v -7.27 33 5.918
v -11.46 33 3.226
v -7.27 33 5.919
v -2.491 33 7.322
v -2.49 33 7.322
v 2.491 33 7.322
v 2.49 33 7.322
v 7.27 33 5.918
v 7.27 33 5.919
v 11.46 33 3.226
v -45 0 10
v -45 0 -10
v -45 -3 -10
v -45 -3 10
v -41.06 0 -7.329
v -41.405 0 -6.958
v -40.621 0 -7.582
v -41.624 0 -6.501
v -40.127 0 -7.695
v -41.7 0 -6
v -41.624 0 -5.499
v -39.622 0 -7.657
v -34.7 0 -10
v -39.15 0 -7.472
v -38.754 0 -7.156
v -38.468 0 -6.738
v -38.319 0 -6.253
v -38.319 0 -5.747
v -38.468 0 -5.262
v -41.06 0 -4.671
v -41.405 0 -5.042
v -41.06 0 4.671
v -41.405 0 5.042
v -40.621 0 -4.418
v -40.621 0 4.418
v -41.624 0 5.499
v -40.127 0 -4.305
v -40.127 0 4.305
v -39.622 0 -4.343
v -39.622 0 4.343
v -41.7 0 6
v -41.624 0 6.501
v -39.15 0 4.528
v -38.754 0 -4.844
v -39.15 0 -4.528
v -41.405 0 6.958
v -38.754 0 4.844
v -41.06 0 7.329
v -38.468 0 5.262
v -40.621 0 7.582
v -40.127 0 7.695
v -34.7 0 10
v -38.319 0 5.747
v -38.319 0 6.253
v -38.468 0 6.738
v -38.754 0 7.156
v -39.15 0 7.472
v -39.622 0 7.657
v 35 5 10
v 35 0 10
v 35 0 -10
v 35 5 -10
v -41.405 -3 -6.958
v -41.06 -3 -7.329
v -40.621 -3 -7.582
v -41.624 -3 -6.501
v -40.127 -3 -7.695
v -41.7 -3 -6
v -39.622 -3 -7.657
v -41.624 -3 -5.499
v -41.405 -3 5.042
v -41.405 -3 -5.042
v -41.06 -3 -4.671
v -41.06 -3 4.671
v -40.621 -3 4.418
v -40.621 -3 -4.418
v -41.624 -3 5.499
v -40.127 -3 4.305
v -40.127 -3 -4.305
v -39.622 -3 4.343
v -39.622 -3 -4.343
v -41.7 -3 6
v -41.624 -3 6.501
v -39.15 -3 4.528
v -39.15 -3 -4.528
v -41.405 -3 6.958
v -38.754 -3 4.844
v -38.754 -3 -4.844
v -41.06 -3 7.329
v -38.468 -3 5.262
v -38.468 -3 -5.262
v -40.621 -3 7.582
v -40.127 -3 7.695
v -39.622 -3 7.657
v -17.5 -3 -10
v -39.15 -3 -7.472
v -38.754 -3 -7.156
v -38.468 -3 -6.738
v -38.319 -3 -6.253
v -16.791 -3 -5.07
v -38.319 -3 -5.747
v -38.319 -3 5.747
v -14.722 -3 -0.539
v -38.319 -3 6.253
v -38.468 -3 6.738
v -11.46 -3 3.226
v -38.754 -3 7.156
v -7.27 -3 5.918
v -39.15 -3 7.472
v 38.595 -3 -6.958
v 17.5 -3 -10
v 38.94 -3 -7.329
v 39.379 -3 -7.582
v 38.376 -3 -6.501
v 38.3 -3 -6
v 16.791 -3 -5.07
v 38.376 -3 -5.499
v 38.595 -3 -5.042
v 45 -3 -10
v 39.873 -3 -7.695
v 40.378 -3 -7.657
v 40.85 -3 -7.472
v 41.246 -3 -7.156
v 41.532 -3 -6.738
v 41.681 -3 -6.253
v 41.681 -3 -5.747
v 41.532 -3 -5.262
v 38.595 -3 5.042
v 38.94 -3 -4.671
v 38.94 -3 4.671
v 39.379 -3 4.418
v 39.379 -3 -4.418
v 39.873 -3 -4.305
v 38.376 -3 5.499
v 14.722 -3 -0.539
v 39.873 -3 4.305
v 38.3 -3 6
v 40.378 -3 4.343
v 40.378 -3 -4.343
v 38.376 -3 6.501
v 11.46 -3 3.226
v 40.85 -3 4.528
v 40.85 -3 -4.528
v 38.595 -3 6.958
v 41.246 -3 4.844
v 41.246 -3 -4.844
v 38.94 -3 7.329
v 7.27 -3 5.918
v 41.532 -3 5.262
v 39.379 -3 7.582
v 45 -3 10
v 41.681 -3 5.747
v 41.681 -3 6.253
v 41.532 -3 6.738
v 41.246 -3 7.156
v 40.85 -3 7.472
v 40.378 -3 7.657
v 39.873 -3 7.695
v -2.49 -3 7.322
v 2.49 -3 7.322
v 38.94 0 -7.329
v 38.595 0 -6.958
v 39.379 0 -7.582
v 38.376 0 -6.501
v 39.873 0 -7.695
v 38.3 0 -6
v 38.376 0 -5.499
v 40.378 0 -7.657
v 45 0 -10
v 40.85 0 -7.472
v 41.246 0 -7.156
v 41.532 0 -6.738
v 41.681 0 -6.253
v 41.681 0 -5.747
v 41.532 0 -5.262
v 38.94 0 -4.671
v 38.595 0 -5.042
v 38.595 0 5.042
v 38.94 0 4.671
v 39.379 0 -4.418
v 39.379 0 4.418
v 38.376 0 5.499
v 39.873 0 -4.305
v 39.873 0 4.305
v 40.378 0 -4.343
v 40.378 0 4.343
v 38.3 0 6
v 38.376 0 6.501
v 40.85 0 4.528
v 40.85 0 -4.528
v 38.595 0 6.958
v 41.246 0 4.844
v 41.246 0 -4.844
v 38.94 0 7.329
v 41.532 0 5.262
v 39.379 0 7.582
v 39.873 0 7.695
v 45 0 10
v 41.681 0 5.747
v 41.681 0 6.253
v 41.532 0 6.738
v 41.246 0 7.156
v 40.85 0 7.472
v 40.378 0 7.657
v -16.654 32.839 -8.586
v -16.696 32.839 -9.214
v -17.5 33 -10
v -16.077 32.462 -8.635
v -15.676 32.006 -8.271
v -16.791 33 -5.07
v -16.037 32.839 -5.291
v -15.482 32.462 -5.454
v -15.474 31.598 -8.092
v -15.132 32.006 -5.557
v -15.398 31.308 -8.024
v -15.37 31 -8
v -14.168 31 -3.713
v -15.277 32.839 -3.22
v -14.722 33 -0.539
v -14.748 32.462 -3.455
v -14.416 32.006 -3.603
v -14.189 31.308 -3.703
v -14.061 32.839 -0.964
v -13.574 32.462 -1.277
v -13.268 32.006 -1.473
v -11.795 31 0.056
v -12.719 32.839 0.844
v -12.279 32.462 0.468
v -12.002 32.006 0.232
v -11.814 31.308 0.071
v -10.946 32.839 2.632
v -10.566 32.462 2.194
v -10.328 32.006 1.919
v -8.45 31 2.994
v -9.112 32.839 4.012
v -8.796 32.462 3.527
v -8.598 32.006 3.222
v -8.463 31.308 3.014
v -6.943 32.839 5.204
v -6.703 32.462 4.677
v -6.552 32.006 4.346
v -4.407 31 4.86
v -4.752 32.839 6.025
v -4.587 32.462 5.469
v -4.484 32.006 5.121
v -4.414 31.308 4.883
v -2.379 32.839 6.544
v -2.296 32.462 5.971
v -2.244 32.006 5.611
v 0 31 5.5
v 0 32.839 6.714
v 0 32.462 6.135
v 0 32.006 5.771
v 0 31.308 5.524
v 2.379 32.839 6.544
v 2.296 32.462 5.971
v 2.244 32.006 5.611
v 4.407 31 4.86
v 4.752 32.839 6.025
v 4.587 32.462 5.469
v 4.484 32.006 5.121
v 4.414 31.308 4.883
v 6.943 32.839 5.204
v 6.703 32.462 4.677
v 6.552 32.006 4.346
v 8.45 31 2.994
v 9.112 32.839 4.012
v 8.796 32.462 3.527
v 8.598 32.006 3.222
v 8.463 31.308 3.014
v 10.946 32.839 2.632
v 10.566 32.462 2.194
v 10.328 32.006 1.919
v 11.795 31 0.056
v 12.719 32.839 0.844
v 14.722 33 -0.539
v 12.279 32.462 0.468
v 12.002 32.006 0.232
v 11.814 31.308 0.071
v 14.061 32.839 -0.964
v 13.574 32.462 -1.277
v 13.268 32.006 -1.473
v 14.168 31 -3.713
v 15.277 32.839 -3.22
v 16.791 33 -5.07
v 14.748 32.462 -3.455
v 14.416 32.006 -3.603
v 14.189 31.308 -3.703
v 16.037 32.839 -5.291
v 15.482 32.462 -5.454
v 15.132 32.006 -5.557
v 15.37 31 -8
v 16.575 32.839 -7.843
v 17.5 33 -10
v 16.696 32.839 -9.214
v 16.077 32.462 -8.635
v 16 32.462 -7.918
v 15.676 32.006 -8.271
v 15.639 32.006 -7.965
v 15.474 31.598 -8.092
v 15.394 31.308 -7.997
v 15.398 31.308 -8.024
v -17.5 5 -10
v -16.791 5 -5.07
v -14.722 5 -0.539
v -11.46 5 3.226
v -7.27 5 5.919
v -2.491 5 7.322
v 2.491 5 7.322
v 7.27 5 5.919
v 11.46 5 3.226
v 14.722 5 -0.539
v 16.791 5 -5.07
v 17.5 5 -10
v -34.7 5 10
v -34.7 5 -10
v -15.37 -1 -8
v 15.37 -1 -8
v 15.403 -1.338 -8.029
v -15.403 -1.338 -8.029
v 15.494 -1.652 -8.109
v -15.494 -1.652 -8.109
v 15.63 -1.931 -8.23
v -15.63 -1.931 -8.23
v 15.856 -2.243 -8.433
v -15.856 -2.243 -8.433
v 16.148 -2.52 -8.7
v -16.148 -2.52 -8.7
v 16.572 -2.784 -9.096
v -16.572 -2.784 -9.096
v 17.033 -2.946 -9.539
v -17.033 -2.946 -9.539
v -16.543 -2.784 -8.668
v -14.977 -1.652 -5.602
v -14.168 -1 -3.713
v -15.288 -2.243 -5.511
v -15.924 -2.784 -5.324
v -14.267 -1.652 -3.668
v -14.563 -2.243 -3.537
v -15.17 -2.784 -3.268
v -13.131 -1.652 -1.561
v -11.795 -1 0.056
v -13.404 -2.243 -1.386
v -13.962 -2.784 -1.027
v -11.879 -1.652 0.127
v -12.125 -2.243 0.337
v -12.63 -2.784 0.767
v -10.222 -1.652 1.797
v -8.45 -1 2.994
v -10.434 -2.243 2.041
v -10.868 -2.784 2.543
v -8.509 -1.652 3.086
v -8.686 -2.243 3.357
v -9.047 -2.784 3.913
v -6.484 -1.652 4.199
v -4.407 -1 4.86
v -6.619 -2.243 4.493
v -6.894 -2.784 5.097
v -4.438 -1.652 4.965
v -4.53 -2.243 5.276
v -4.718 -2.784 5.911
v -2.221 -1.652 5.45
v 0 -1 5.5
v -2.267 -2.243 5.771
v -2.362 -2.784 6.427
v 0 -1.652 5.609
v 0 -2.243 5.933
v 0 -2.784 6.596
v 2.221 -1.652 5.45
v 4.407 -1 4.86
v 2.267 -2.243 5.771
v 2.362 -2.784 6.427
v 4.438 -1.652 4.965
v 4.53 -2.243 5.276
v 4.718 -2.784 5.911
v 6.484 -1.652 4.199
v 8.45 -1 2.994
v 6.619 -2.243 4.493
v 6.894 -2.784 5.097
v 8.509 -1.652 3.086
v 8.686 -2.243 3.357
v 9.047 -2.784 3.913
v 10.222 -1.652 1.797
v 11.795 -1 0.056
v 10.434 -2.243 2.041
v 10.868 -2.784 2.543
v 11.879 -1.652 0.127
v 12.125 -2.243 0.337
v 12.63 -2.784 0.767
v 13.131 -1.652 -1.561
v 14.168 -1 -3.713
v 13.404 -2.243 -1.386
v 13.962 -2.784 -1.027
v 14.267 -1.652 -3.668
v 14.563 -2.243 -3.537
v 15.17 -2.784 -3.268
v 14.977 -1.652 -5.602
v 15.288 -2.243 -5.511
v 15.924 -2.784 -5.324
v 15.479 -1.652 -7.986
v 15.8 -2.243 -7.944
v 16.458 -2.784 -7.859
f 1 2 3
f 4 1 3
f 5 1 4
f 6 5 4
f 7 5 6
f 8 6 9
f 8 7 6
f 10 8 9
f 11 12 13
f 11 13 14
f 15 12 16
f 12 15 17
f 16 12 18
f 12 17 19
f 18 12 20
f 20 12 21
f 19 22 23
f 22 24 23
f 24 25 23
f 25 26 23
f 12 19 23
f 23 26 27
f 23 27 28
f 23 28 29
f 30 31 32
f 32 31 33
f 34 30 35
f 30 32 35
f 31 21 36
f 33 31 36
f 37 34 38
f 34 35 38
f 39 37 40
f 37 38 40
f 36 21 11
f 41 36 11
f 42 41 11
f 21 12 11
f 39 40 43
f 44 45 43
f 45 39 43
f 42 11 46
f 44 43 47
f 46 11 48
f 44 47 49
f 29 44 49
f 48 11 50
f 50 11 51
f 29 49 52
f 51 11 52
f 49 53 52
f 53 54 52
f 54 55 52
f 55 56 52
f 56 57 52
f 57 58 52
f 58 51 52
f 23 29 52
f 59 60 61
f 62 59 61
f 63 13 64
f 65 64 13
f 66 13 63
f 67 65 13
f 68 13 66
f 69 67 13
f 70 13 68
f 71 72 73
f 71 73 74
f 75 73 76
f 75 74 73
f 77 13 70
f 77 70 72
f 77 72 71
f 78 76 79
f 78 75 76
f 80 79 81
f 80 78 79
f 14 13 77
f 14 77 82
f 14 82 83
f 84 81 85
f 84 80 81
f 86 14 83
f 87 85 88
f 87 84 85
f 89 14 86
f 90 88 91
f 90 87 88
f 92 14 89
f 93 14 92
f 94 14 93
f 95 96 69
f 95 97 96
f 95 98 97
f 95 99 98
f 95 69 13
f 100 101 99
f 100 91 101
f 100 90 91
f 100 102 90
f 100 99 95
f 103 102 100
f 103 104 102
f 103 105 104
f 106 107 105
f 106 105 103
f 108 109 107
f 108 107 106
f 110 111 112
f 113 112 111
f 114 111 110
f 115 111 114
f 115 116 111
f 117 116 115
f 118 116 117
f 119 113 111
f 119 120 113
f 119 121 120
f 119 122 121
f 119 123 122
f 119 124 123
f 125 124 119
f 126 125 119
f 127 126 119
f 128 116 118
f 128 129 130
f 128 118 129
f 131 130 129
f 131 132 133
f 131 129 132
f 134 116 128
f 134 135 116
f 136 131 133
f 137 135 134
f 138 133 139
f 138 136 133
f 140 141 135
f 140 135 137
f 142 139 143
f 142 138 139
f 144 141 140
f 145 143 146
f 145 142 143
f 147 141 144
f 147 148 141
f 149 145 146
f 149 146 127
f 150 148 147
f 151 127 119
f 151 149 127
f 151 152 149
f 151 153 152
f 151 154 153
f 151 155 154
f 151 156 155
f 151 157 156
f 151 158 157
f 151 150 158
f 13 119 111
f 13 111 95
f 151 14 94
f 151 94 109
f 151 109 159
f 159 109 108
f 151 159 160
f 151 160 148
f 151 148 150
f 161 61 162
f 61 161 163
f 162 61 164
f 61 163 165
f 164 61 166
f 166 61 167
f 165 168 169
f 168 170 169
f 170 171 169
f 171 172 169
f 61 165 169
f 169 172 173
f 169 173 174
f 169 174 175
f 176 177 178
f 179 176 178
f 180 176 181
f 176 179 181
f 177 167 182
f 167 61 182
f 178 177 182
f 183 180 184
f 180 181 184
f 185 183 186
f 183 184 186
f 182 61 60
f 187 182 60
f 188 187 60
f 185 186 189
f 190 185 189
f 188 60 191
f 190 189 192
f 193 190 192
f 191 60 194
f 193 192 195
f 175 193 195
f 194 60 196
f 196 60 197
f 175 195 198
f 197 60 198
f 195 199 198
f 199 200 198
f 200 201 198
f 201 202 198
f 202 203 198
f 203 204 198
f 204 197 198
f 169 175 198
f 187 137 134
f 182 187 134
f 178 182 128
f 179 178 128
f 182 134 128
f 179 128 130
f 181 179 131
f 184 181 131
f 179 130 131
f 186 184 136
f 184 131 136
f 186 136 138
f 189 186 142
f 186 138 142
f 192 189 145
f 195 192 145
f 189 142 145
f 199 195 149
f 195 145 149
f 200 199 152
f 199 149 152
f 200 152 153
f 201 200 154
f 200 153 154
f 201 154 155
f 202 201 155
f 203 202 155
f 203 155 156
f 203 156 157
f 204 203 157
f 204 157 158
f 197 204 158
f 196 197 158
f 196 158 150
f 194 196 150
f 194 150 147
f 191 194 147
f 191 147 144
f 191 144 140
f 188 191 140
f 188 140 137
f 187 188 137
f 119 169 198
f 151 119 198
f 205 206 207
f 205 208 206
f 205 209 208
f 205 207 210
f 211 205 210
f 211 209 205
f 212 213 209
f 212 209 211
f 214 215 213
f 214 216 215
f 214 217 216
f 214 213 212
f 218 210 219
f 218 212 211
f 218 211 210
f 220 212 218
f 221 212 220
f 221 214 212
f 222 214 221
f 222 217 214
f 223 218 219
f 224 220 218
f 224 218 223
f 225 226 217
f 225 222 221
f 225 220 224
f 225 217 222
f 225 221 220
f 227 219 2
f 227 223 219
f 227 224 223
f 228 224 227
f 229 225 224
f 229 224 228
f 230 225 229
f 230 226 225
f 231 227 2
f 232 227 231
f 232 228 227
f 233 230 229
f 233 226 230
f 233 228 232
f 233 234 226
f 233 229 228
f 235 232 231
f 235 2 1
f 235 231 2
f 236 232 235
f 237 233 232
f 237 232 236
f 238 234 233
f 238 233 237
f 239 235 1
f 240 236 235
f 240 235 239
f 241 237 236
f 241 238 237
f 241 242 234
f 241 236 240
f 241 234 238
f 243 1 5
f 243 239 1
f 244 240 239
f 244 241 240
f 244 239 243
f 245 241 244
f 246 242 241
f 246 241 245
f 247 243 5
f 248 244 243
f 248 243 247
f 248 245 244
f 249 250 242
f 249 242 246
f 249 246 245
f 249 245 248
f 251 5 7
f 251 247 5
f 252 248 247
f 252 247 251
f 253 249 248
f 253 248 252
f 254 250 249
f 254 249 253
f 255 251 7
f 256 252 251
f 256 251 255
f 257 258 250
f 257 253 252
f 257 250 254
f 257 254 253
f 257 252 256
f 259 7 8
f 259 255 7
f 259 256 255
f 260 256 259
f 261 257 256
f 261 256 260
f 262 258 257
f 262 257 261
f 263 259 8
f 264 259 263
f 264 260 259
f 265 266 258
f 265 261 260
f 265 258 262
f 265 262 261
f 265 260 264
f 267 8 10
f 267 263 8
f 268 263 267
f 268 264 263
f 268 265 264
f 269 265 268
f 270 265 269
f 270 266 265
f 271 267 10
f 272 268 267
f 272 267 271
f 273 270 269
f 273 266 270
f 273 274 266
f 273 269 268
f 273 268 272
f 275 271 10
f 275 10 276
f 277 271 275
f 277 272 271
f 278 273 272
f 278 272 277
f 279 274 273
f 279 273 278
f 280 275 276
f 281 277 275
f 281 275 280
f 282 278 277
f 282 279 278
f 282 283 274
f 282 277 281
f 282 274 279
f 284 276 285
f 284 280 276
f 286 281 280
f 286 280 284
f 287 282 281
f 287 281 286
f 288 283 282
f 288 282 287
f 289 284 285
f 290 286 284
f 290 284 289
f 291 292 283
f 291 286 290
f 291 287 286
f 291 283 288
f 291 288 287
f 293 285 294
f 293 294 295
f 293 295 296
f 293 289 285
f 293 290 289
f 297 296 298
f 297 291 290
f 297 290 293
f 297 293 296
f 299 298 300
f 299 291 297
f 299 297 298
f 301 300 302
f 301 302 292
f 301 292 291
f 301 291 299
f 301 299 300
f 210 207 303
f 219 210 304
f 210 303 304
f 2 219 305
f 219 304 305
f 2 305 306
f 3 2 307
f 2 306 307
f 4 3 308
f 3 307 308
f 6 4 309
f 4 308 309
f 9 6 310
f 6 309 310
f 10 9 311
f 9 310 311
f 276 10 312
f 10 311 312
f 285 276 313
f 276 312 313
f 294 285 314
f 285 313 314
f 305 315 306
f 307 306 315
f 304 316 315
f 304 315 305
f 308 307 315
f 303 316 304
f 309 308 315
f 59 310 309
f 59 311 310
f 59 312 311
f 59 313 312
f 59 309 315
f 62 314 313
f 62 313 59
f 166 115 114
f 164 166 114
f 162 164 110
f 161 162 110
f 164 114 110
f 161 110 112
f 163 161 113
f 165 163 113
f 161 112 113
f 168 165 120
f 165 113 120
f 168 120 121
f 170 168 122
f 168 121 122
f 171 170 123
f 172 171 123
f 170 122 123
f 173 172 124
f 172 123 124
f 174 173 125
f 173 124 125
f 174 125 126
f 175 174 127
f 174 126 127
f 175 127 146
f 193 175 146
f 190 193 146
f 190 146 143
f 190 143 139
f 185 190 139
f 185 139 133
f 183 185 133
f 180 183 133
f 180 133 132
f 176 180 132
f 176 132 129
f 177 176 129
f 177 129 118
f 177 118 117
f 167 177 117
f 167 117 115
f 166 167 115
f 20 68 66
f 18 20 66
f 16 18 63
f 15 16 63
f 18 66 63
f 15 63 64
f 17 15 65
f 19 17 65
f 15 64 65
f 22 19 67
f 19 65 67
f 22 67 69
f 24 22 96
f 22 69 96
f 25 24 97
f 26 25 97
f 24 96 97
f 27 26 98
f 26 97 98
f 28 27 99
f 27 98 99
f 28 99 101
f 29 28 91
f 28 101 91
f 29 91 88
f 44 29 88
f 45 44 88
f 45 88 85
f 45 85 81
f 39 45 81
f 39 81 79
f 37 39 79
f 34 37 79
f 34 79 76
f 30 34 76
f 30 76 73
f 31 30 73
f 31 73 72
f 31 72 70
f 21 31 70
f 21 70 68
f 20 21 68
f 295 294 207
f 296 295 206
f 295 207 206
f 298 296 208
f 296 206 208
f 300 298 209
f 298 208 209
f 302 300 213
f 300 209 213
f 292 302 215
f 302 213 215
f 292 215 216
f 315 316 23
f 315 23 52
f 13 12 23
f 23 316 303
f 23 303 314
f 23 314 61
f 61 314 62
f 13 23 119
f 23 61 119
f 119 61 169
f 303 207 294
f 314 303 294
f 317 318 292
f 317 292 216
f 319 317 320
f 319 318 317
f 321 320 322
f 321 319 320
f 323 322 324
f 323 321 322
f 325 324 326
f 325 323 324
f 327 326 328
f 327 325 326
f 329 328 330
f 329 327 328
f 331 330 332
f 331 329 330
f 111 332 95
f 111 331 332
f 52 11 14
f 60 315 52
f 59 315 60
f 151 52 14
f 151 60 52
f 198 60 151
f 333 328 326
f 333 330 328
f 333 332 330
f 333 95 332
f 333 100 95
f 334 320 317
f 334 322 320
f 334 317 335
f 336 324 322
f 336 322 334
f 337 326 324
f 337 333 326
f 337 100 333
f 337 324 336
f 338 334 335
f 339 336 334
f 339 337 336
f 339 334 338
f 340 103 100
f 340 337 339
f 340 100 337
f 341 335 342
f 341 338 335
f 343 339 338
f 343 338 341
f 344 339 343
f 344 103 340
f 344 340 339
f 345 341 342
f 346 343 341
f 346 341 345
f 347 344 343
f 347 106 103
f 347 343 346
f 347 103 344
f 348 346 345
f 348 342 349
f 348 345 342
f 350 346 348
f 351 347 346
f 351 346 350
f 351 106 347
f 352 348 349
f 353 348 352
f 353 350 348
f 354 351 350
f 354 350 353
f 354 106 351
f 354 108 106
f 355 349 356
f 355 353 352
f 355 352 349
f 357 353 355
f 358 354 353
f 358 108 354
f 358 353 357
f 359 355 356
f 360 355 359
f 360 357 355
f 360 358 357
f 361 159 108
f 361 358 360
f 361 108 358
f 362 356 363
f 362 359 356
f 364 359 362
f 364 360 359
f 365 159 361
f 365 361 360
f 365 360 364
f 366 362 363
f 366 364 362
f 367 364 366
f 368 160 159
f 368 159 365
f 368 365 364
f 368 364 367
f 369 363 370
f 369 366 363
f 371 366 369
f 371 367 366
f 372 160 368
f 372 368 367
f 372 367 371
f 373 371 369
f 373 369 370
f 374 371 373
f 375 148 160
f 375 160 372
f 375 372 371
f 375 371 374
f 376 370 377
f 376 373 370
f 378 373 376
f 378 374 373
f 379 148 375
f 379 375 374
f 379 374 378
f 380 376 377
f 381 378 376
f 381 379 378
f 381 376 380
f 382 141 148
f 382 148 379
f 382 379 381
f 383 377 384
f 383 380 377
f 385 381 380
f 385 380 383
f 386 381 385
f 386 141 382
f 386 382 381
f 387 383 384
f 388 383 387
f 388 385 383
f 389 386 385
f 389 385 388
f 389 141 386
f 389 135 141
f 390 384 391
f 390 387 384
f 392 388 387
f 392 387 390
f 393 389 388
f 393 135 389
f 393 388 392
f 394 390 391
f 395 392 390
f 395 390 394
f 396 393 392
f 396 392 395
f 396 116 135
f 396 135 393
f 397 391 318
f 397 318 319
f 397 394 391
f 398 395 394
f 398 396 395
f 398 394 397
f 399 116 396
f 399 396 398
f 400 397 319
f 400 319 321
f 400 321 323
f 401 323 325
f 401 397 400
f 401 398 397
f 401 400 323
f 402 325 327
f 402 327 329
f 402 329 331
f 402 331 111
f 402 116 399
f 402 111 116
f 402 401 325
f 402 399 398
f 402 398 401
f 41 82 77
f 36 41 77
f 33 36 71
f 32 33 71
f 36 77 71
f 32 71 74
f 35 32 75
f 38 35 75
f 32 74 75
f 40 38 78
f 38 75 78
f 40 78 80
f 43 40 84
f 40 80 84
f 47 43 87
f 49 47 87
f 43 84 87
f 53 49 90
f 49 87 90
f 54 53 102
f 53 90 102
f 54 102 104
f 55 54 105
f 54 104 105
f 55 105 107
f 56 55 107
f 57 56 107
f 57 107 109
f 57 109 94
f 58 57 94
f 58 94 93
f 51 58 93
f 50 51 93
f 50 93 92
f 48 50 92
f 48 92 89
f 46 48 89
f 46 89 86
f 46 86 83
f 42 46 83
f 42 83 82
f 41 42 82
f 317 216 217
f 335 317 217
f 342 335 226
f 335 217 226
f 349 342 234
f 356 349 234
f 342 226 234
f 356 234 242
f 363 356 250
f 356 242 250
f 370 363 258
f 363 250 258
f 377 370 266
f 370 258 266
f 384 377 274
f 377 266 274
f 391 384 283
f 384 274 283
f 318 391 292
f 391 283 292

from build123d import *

# Parameters (mm, degrees)
SKETCH1_W                = 70
SKETCH1_H                = 20
BOSS_EXTRUDE1_DEPTH      = 5
SKETCH2_W                = 90
SKETCH2_H                = 20
BOSS_EXTRUDE2_DEPTH      = 3
BOSS_EXTRUDE3_DEPTH      = 28
CUT_EXTRUDE1_DEPTH       = 59.489315264
FILLET1_R                = 2
FILLET2_R                = 2
M3_CLEARANCE_HOLE1_D     = 3.4
M3_CLEARANCE_HOLE1_DEPTH = 10
M3_CLEARANCE_HOLE1_TIP   = 1.021463052
SKETCH9_W                = 20
SKETCH9_H                = 5
CUT_EXTRUDE2_DEPTH       = 0.3


with BuildPart() as part:
    # Sketch1 → Boss-Extrude1 (new body)
    with BuildSketch(Plane(origin=(0, 0, 0), x_dir=(1, 0, 0), z_dir=(0, 1, 0))):
        Rectangle(SKETCH1_W, SKETCH1_H)
    extrude(amount=BOSS_EXTRUDE1_DEPTH)

    # Sketch2 → Boss-Extrude2 (add)
    with BuildSketch(Plane.XZ):
        Rectangle(SKETCH2_W, SKETCH2_H)
    extrude(amount=BOSS_EXTRUDE2_DEPTH)

    # Sketch4 → Boss-Extrude3 (add)
    with BuildSketch(Plane(origin=(0, 5, 0), x_dir=(1, 0, 0), z_dir=(0, 1, 0))):
        with BuildLine():
            Line((17.5, 10), (-17.5, 10))
            ThreePointArc((-17.5, 10), (0, -7.5), (17.5, 10))
        make_face()
    extrude(amount=BOSS_EXTRUDE3_DEPTH)

    # Sketch6 → Cut-Extrude1 (cut, through all)
    with BuildSketch(Plane(origin=(0, 33, 0), x_dir=(1, 0, 0), z_dir=(0, 1, 0))):
        with BuildLine():
            Line((15.370426149, 8), (-15.370426149, 8))
            ThreePointArc((-15.370426149, 8), (0, -5.5), (15.370426149, 8))
        make_face()
    extrude(amount=-CUT_EXTRUDE1_DEPTH, mode=Mode.SUBTRACT)

    # Fillet1
    fillet1_edges = [part.edges().sort_by_distance(p)[0] for p in [
        (0, 33, 5.5),
        (0, 33, -8),
    ]]
    fillet(fillet1_edges, radius=FILLET1_R - 0.0001)  # a hair under: the kernel refuses the full size

    # Fillet2
    fillet2_edges = [part.edges().sort_by_distance(p)[0] for p in [
        (0, -3, 5.5),
        (0, -3, -8),
    ]]
    fillet(fillet2_edges, radius=FILLET2_R - 0.0001)  # a hair under: the kernel refuses the full size

    # M3 Clearance Hole1
    with Locations(Plane(origin=(0, 0, 0), x_dir=(1, 0, 0), z_dir=(0, 1, 0))):
        with Locations((-40, 6), (-40, -6), (40, 6), (40, -6)):
            Hole(M3_CLEARANCE_HOLE1_D / 2, depth=M3_CLEARANCE_HOLE1_DEPTH)
            with Locations((0, 0, -(M3_CLEARANCE_HOLE1_DEPTH + M3_CLEARANCE_HOLE1_TIP / 2))):  # 118° drill point
                Cone(0, M3_CLEARANCE_HOLE1_D / 2, M3_CLEARANCE_HOLE1_TIP, mode=Mode.SUBTRACT)

    # Sketch9 → Cut-Extrude2 (cut)
    with BuildSketch(Plane.ZY.offset(35)):
        with Locations((0, 2.5)):
            Rectangle(SKETCH9_W, SKETCH9_H)
    extrude(amount=-CUT_EXTRUDE2_DEPTH, mode=Mode.SUBTRACT)


solid = part.part
